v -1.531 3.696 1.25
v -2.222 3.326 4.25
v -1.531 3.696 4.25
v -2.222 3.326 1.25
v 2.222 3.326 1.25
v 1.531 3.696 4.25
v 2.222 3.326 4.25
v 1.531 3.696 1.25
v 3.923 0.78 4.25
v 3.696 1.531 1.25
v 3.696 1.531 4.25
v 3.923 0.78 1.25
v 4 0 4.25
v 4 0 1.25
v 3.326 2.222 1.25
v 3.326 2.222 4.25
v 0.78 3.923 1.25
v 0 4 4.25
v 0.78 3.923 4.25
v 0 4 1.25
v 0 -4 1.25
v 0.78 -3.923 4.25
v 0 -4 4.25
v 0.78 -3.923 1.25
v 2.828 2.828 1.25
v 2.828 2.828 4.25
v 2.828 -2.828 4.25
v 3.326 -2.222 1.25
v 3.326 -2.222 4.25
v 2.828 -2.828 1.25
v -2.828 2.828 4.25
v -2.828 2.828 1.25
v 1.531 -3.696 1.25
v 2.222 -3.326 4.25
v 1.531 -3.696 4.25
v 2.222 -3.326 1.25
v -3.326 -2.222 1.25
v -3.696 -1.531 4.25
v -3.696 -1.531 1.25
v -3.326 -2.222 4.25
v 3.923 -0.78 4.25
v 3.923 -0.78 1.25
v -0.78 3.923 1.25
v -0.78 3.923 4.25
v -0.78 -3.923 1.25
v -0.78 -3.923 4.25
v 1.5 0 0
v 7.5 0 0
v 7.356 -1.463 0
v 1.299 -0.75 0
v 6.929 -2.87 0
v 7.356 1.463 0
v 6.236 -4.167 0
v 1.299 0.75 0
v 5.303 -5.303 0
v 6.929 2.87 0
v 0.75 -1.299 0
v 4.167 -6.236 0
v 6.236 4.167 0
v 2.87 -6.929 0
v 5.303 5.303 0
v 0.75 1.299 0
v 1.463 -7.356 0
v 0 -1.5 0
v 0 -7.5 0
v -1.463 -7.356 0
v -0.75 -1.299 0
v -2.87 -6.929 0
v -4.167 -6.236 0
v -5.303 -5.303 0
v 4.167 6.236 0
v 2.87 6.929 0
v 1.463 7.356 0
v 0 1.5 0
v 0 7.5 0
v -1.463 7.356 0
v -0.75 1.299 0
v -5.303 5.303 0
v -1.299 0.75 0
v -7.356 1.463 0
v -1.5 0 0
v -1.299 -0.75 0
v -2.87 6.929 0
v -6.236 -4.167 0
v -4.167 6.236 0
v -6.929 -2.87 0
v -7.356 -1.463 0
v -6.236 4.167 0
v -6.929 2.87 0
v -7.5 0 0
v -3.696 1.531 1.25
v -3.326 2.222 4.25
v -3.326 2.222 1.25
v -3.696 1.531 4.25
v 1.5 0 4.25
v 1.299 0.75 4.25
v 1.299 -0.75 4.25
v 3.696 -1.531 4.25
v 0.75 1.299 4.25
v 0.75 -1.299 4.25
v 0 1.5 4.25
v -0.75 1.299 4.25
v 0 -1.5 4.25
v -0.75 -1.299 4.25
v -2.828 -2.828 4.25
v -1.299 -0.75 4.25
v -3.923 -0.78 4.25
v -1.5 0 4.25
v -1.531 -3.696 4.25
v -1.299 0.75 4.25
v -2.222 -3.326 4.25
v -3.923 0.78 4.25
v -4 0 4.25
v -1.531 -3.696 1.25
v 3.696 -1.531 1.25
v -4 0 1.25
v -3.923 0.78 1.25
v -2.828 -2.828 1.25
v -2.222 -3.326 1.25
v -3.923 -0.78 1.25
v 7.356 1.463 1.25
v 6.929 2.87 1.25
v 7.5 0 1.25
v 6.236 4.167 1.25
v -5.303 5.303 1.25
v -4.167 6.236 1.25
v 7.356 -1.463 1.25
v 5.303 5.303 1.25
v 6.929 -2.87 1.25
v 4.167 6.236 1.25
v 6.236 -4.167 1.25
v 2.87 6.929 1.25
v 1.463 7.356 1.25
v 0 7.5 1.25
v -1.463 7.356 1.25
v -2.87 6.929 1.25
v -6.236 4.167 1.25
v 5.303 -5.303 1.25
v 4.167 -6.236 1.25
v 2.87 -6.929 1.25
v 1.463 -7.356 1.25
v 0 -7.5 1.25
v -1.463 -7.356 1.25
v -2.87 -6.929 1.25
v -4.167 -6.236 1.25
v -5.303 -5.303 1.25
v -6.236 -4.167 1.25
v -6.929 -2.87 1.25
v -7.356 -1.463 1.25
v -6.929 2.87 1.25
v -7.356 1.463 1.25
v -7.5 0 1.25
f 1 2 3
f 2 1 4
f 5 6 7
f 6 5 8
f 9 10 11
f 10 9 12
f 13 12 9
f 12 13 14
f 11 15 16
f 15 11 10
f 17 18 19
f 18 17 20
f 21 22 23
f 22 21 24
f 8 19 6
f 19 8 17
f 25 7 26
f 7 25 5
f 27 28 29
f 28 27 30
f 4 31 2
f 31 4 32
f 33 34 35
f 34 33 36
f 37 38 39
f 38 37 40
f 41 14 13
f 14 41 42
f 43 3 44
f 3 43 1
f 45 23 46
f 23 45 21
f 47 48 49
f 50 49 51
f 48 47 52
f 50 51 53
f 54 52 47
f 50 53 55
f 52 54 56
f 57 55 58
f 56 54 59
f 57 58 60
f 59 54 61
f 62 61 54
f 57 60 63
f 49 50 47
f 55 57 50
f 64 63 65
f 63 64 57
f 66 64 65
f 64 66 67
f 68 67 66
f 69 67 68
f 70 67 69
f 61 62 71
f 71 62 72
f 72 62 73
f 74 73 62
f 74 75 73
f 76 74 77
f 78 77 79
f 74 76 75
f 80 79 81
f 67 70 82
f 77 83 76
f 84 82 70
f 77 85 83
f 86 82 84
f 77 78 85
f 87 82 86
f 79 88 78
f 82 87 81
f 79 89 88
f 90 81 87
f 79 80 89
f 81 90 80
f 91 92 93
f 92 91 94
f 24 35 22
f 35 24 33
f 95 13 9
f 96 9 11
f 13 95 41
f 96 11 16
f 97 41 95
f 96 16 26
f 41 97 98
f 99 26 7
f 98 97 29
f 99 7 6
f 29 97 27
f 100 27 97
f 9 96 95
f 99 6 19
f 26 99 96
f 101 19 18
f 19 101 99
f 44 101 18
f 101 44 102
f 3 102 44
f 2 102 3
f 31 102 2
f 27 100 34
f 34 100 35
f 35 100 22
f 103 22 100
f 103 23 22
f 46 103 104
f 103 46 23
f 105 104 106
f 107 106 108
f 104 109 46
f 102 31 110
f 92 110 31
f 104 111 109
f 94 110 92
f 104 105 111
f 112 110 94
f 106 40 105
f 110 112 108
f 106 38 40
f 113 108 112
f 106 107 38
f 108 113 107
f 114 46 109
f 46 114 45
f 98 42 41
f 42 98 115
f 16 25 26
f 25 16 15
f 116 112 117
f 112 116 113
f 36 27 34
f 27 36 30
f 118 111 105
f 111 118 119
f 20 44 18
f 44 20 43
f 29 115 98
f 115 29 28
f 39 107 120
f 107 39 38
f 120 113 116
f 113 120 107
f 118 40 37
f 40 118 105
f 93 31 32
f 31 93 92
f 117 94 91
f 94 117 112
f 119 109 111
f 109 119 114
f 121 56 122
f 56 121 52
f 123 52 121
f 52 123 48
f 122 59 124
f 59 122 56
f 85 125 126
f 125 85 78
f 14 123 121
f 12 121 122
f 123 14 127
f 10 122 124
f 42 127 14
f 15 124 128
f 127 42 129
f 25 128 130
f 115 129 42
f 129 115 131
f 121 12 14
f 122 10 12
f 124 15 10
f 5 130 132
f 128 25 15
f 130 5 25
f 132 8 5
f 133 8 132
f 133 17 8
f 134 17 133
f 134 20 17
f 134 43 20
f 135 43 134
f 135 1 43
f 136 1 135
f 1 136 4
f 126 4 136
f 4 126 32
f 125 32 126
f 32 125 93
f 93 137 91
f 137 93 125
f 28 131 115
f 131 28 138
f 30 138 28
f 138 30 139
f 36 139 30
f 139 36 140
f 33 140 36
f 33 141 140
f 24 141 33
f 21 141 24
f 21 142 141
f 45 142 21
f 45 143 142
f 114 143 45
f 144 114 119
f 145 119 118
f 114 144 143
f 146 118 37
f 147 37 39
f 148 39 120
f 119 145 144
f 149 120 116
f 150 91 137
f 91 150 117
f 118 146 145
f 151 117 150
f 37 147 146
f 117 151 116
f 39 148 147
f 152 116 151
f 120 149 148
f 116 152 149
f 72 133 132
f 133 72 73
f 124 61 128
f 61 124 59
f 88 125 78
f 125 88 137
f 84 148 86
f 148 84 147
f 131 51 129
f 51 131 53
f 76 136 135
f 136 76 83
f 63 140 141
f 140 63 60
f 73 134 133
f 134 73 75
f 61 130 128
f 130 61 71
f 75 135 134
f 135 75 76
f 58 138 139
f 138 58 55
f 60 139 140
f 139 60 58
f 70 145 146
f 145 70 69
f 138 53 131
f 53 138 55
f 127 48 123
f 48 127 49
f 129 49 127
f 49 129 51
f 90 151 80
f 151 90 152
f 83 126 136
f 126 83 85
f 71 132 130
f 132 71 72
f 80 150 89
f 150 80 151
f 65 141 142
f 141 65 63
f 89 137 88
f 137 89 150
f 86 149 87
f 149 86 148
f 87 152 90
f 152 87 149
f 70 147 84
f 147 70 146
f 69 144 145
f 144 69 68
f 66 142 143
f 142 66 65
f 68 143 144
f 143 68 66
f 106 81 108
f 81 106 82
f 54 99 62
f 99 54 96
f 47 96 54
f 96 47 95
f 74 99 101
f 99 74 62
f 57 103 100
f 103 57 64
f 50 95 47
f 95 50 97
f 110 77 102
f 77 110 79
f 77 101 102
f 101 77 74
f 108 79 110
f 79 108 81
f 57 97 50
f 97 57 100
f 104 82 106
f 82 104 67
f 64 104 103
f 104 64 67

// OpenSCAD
shaft_width = 9.5;
bearing_width = 7.0;
bearing_inner_diameter = 8.0;
bearing_outer_diameter = 22.0;

inner_height = bearing_width / 2.0;
outer_height = (shaft_width - bearing_width) / 2.0;

axis_diameter = 3.0;

difference()
{
    union()
    {
        cylinder(
            h = inner_height + outer_height - 0.5,
            d = bearing_inner_diameter,
            $fn = 32);
        
        cylinder(
            h = outer_height,
            d = (bearing_outer_diameter + bearing_inner_diameter) / 2.0,
            $fn = 32);
    }
    cylinder(
        h = shaft_width,
        d = axis_diameter,
        center = true,
        $fn = 12);
    }
